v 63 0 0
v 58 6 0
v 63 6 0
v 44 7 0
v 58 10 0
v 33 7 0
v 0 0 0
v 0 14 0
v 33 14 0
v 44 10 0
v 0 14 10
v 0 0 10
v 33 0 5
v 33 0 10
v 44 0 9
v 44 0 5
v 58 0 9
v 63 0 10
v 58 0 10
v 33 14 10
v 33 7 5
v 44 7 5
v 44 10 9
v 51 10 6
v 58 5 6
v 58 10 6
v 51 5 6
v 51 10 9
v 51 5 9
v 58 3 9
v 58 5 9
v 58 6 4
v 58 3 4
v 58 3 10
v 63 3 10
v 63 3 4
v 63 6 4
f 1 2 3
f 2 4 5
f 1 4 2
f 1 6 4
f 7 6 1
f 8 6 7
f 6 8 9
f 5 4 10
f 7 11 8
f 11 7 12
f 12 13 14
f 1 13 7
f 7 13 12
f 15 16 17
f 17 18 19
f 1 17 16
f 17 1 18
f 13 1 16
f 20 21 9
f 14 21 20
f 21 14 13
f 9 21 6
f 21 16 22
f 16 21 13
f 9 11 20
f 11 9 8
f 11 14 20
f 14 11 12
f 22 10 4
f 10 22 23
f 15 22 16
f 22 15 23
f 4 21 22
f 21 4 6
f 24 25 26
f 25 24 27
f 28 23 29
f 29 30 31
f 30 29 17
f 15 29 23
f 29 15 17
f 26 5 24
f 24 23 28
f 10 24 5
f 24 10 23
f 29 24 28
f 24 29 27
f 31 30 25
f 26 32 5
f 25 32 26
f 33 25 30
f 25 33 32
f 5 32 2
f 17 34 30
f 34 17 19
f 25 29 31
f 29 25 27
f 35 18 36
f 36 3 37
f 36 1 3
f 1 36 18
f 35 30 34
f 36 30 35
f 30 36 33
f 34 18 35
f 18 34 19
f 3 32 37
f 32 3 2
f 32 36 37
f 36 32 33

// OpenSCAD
translate([5.5, 3.5, 2.5]) color([0.18675586852140846, 0.05699047999950346, 0.6380736282281027]) cube([11, 7, 5], center=true);
translate([16.5, 3.5, 2.5]) color([0.17337386483746886, 0.6107798762435255, 0.6125067478912297]) cube([11, 7, 5], center=true);
translate([27.5, 3.5, 2.5]) color([0.7049237107399368, 0.5121186506114312, 0.28442399033479826]) cube([11, 7, 5], center=true);
translate([5.5, 10.5, 2.5]) color([0.8774574539285279, 0.35307108172351365, 0.4582943249787391]) cube([11, 7, 5], center=true);
translate([16.5, 10.5, 2.5]) color([0.6318794317305464, 0.5161242981674495, 0.9564683485665337]) cube([11, 7, 5], center=true);
translate([27.5, 10.5, 2.5]) color([0.9547176774381221, 0.9297598506094263, 0.9340763496652581]) cube([11, 7, 5], center=true);
translate([5.5, 3.5, 7.5]) color([0.580960135568696, 0.49020206373000297, 0.7041168173823689]) cube([11, 7, 5], center=true);
translate([16.5, 3.5, 7.5]) color([0.21541959298546798, 0.26587203921552827, 0.04380725363309168]) cube([11, 7, 5], center=true);
translate([27.5, 3.5, 7.5]) color([0.16285754255803098, 0.0038745499388105342, 0.6546275765234981]) cube([11, 7, 5], center=true);
translate([5.5, 10.5, 7.5]) color([0.14040698903568194, 0.7866793455760521, 0.680503995881725]) cube([11, 7, 5], center=true);
translate([16.5, 10.5, 7.5]) color([0.9706757933544957, 0.3965144869518913, 0.9213919134510528]) cube([11, 7, 5], center=true);
translate([27.5, 10.5, 7.5]) color([0.4537041723195332, 0.3395037398362071, 0.10233886991705377]) cube([11, 7, 5], center=true);
translate([38.5, 3.5, 2.5]) color([0.8828321850718597, 0.7947901585625868, 0.3229289765350606]) cube([11, 7, 5], center=true);
translate([47.5, 2.5, 1.5]) color([0.45574438492562896, 0.32514346581324827, 0.028829116538094723]) cube([7, 5, 3], center=true);
translate([47.5, 2.5, 4.5]) color([0.04435252539911694, 0.3687041258820589, 0.20959132812878367]) cube([7, 5, 3], center=true);
translate([47.5, 2.5, 7.5]) color([0.5245146032105923, 0.1877850356496189, 0.2016215864664097]) cube([7, 5, 3], center=true);
translate([47.5, 7.5, 1.5]) color([0.6726678813176303, 0.7356026567617159, 0.31223209587410494]) cube([7, 5, 3], center=true);
translate([47.5, 7.5, 4.5]) color([0.8599943994333726, 0.2546391746557106, 0.34394037628155716]) cube([7, 5, 3], center=true);
translate([47.5, 7.5, 7.5]) color([0.712480390369609, 0.04450290132920964, 0.934183460116191]) cube([7, 5, 3], center=true);
translate([54.5, 2.5, 1.5]) color([0.07233773178762537, 0.4609310589380602, 0.7246048259600892]) cube([7, 5, 3], center=true);
translate([54.5, 2.5, 4.5]) color([0.04746853498479808, 0.8090026856371774, 0.9788933433114139]) cube([7, 5, 3], center=true);
translate([54.5, 2.5, 7.5]) color([0.460511672795628, 0.11812363628756806, 0.08147699565547994]) cube([7, 5, 3], center=true);
translate([54.5, 7.5, 1.5]) color([0.09873043616313526, 0.7654413741364753, 0.4140128484685186]) cube([7, 5, 3], center=true);
translate([54.5, 7.5, 4.5]) color([0.9192341581990311, 0.4406397760864845, 0.07714331014460807]) cube([7, 5, 3], center=true);
translate([60.5, 1.5, 1.0]) color([0.42693558751800065, 0.7548278934255565, 0.8293384268467949]) cube([5, 3, 2], center=true);
translate([60.5, 1.5, 3.0]) color([0.039351686529191854, 0.1803893912563338, 0.490013452023644]) cube([5, 3, 2], center=true);
translate([60.5, 1.5, 5.0]) color([0.12808547795160863, 0.8710926419421733, 0.9344608884461488]) cube([5, 3, 2], center=true);
translate([60.5, 1.5, 7.0]) color([0.3195969983538176, 0.43484368255202, 0.5570540644200566]) cube([5, 3, 2], center=true);
translate([60.5, 1.5, 9.0]) color([0.2855057910835891, 0.5410756974595614, 0.2011850454737838]) cube([5, 3, 2], center=true);
translate([60.5, 4.5, 1.0]) color([0.2966412512769129, 0.44178363318767744, 0.604669902191143]) cube([5, 3, 2], center=true);
translate([60.5, 4.5, 3.0]) color([0.5361650260862432, 0.2609879767339395, 0.23178787541805523]) cube([5, 3, 2], center=true);
